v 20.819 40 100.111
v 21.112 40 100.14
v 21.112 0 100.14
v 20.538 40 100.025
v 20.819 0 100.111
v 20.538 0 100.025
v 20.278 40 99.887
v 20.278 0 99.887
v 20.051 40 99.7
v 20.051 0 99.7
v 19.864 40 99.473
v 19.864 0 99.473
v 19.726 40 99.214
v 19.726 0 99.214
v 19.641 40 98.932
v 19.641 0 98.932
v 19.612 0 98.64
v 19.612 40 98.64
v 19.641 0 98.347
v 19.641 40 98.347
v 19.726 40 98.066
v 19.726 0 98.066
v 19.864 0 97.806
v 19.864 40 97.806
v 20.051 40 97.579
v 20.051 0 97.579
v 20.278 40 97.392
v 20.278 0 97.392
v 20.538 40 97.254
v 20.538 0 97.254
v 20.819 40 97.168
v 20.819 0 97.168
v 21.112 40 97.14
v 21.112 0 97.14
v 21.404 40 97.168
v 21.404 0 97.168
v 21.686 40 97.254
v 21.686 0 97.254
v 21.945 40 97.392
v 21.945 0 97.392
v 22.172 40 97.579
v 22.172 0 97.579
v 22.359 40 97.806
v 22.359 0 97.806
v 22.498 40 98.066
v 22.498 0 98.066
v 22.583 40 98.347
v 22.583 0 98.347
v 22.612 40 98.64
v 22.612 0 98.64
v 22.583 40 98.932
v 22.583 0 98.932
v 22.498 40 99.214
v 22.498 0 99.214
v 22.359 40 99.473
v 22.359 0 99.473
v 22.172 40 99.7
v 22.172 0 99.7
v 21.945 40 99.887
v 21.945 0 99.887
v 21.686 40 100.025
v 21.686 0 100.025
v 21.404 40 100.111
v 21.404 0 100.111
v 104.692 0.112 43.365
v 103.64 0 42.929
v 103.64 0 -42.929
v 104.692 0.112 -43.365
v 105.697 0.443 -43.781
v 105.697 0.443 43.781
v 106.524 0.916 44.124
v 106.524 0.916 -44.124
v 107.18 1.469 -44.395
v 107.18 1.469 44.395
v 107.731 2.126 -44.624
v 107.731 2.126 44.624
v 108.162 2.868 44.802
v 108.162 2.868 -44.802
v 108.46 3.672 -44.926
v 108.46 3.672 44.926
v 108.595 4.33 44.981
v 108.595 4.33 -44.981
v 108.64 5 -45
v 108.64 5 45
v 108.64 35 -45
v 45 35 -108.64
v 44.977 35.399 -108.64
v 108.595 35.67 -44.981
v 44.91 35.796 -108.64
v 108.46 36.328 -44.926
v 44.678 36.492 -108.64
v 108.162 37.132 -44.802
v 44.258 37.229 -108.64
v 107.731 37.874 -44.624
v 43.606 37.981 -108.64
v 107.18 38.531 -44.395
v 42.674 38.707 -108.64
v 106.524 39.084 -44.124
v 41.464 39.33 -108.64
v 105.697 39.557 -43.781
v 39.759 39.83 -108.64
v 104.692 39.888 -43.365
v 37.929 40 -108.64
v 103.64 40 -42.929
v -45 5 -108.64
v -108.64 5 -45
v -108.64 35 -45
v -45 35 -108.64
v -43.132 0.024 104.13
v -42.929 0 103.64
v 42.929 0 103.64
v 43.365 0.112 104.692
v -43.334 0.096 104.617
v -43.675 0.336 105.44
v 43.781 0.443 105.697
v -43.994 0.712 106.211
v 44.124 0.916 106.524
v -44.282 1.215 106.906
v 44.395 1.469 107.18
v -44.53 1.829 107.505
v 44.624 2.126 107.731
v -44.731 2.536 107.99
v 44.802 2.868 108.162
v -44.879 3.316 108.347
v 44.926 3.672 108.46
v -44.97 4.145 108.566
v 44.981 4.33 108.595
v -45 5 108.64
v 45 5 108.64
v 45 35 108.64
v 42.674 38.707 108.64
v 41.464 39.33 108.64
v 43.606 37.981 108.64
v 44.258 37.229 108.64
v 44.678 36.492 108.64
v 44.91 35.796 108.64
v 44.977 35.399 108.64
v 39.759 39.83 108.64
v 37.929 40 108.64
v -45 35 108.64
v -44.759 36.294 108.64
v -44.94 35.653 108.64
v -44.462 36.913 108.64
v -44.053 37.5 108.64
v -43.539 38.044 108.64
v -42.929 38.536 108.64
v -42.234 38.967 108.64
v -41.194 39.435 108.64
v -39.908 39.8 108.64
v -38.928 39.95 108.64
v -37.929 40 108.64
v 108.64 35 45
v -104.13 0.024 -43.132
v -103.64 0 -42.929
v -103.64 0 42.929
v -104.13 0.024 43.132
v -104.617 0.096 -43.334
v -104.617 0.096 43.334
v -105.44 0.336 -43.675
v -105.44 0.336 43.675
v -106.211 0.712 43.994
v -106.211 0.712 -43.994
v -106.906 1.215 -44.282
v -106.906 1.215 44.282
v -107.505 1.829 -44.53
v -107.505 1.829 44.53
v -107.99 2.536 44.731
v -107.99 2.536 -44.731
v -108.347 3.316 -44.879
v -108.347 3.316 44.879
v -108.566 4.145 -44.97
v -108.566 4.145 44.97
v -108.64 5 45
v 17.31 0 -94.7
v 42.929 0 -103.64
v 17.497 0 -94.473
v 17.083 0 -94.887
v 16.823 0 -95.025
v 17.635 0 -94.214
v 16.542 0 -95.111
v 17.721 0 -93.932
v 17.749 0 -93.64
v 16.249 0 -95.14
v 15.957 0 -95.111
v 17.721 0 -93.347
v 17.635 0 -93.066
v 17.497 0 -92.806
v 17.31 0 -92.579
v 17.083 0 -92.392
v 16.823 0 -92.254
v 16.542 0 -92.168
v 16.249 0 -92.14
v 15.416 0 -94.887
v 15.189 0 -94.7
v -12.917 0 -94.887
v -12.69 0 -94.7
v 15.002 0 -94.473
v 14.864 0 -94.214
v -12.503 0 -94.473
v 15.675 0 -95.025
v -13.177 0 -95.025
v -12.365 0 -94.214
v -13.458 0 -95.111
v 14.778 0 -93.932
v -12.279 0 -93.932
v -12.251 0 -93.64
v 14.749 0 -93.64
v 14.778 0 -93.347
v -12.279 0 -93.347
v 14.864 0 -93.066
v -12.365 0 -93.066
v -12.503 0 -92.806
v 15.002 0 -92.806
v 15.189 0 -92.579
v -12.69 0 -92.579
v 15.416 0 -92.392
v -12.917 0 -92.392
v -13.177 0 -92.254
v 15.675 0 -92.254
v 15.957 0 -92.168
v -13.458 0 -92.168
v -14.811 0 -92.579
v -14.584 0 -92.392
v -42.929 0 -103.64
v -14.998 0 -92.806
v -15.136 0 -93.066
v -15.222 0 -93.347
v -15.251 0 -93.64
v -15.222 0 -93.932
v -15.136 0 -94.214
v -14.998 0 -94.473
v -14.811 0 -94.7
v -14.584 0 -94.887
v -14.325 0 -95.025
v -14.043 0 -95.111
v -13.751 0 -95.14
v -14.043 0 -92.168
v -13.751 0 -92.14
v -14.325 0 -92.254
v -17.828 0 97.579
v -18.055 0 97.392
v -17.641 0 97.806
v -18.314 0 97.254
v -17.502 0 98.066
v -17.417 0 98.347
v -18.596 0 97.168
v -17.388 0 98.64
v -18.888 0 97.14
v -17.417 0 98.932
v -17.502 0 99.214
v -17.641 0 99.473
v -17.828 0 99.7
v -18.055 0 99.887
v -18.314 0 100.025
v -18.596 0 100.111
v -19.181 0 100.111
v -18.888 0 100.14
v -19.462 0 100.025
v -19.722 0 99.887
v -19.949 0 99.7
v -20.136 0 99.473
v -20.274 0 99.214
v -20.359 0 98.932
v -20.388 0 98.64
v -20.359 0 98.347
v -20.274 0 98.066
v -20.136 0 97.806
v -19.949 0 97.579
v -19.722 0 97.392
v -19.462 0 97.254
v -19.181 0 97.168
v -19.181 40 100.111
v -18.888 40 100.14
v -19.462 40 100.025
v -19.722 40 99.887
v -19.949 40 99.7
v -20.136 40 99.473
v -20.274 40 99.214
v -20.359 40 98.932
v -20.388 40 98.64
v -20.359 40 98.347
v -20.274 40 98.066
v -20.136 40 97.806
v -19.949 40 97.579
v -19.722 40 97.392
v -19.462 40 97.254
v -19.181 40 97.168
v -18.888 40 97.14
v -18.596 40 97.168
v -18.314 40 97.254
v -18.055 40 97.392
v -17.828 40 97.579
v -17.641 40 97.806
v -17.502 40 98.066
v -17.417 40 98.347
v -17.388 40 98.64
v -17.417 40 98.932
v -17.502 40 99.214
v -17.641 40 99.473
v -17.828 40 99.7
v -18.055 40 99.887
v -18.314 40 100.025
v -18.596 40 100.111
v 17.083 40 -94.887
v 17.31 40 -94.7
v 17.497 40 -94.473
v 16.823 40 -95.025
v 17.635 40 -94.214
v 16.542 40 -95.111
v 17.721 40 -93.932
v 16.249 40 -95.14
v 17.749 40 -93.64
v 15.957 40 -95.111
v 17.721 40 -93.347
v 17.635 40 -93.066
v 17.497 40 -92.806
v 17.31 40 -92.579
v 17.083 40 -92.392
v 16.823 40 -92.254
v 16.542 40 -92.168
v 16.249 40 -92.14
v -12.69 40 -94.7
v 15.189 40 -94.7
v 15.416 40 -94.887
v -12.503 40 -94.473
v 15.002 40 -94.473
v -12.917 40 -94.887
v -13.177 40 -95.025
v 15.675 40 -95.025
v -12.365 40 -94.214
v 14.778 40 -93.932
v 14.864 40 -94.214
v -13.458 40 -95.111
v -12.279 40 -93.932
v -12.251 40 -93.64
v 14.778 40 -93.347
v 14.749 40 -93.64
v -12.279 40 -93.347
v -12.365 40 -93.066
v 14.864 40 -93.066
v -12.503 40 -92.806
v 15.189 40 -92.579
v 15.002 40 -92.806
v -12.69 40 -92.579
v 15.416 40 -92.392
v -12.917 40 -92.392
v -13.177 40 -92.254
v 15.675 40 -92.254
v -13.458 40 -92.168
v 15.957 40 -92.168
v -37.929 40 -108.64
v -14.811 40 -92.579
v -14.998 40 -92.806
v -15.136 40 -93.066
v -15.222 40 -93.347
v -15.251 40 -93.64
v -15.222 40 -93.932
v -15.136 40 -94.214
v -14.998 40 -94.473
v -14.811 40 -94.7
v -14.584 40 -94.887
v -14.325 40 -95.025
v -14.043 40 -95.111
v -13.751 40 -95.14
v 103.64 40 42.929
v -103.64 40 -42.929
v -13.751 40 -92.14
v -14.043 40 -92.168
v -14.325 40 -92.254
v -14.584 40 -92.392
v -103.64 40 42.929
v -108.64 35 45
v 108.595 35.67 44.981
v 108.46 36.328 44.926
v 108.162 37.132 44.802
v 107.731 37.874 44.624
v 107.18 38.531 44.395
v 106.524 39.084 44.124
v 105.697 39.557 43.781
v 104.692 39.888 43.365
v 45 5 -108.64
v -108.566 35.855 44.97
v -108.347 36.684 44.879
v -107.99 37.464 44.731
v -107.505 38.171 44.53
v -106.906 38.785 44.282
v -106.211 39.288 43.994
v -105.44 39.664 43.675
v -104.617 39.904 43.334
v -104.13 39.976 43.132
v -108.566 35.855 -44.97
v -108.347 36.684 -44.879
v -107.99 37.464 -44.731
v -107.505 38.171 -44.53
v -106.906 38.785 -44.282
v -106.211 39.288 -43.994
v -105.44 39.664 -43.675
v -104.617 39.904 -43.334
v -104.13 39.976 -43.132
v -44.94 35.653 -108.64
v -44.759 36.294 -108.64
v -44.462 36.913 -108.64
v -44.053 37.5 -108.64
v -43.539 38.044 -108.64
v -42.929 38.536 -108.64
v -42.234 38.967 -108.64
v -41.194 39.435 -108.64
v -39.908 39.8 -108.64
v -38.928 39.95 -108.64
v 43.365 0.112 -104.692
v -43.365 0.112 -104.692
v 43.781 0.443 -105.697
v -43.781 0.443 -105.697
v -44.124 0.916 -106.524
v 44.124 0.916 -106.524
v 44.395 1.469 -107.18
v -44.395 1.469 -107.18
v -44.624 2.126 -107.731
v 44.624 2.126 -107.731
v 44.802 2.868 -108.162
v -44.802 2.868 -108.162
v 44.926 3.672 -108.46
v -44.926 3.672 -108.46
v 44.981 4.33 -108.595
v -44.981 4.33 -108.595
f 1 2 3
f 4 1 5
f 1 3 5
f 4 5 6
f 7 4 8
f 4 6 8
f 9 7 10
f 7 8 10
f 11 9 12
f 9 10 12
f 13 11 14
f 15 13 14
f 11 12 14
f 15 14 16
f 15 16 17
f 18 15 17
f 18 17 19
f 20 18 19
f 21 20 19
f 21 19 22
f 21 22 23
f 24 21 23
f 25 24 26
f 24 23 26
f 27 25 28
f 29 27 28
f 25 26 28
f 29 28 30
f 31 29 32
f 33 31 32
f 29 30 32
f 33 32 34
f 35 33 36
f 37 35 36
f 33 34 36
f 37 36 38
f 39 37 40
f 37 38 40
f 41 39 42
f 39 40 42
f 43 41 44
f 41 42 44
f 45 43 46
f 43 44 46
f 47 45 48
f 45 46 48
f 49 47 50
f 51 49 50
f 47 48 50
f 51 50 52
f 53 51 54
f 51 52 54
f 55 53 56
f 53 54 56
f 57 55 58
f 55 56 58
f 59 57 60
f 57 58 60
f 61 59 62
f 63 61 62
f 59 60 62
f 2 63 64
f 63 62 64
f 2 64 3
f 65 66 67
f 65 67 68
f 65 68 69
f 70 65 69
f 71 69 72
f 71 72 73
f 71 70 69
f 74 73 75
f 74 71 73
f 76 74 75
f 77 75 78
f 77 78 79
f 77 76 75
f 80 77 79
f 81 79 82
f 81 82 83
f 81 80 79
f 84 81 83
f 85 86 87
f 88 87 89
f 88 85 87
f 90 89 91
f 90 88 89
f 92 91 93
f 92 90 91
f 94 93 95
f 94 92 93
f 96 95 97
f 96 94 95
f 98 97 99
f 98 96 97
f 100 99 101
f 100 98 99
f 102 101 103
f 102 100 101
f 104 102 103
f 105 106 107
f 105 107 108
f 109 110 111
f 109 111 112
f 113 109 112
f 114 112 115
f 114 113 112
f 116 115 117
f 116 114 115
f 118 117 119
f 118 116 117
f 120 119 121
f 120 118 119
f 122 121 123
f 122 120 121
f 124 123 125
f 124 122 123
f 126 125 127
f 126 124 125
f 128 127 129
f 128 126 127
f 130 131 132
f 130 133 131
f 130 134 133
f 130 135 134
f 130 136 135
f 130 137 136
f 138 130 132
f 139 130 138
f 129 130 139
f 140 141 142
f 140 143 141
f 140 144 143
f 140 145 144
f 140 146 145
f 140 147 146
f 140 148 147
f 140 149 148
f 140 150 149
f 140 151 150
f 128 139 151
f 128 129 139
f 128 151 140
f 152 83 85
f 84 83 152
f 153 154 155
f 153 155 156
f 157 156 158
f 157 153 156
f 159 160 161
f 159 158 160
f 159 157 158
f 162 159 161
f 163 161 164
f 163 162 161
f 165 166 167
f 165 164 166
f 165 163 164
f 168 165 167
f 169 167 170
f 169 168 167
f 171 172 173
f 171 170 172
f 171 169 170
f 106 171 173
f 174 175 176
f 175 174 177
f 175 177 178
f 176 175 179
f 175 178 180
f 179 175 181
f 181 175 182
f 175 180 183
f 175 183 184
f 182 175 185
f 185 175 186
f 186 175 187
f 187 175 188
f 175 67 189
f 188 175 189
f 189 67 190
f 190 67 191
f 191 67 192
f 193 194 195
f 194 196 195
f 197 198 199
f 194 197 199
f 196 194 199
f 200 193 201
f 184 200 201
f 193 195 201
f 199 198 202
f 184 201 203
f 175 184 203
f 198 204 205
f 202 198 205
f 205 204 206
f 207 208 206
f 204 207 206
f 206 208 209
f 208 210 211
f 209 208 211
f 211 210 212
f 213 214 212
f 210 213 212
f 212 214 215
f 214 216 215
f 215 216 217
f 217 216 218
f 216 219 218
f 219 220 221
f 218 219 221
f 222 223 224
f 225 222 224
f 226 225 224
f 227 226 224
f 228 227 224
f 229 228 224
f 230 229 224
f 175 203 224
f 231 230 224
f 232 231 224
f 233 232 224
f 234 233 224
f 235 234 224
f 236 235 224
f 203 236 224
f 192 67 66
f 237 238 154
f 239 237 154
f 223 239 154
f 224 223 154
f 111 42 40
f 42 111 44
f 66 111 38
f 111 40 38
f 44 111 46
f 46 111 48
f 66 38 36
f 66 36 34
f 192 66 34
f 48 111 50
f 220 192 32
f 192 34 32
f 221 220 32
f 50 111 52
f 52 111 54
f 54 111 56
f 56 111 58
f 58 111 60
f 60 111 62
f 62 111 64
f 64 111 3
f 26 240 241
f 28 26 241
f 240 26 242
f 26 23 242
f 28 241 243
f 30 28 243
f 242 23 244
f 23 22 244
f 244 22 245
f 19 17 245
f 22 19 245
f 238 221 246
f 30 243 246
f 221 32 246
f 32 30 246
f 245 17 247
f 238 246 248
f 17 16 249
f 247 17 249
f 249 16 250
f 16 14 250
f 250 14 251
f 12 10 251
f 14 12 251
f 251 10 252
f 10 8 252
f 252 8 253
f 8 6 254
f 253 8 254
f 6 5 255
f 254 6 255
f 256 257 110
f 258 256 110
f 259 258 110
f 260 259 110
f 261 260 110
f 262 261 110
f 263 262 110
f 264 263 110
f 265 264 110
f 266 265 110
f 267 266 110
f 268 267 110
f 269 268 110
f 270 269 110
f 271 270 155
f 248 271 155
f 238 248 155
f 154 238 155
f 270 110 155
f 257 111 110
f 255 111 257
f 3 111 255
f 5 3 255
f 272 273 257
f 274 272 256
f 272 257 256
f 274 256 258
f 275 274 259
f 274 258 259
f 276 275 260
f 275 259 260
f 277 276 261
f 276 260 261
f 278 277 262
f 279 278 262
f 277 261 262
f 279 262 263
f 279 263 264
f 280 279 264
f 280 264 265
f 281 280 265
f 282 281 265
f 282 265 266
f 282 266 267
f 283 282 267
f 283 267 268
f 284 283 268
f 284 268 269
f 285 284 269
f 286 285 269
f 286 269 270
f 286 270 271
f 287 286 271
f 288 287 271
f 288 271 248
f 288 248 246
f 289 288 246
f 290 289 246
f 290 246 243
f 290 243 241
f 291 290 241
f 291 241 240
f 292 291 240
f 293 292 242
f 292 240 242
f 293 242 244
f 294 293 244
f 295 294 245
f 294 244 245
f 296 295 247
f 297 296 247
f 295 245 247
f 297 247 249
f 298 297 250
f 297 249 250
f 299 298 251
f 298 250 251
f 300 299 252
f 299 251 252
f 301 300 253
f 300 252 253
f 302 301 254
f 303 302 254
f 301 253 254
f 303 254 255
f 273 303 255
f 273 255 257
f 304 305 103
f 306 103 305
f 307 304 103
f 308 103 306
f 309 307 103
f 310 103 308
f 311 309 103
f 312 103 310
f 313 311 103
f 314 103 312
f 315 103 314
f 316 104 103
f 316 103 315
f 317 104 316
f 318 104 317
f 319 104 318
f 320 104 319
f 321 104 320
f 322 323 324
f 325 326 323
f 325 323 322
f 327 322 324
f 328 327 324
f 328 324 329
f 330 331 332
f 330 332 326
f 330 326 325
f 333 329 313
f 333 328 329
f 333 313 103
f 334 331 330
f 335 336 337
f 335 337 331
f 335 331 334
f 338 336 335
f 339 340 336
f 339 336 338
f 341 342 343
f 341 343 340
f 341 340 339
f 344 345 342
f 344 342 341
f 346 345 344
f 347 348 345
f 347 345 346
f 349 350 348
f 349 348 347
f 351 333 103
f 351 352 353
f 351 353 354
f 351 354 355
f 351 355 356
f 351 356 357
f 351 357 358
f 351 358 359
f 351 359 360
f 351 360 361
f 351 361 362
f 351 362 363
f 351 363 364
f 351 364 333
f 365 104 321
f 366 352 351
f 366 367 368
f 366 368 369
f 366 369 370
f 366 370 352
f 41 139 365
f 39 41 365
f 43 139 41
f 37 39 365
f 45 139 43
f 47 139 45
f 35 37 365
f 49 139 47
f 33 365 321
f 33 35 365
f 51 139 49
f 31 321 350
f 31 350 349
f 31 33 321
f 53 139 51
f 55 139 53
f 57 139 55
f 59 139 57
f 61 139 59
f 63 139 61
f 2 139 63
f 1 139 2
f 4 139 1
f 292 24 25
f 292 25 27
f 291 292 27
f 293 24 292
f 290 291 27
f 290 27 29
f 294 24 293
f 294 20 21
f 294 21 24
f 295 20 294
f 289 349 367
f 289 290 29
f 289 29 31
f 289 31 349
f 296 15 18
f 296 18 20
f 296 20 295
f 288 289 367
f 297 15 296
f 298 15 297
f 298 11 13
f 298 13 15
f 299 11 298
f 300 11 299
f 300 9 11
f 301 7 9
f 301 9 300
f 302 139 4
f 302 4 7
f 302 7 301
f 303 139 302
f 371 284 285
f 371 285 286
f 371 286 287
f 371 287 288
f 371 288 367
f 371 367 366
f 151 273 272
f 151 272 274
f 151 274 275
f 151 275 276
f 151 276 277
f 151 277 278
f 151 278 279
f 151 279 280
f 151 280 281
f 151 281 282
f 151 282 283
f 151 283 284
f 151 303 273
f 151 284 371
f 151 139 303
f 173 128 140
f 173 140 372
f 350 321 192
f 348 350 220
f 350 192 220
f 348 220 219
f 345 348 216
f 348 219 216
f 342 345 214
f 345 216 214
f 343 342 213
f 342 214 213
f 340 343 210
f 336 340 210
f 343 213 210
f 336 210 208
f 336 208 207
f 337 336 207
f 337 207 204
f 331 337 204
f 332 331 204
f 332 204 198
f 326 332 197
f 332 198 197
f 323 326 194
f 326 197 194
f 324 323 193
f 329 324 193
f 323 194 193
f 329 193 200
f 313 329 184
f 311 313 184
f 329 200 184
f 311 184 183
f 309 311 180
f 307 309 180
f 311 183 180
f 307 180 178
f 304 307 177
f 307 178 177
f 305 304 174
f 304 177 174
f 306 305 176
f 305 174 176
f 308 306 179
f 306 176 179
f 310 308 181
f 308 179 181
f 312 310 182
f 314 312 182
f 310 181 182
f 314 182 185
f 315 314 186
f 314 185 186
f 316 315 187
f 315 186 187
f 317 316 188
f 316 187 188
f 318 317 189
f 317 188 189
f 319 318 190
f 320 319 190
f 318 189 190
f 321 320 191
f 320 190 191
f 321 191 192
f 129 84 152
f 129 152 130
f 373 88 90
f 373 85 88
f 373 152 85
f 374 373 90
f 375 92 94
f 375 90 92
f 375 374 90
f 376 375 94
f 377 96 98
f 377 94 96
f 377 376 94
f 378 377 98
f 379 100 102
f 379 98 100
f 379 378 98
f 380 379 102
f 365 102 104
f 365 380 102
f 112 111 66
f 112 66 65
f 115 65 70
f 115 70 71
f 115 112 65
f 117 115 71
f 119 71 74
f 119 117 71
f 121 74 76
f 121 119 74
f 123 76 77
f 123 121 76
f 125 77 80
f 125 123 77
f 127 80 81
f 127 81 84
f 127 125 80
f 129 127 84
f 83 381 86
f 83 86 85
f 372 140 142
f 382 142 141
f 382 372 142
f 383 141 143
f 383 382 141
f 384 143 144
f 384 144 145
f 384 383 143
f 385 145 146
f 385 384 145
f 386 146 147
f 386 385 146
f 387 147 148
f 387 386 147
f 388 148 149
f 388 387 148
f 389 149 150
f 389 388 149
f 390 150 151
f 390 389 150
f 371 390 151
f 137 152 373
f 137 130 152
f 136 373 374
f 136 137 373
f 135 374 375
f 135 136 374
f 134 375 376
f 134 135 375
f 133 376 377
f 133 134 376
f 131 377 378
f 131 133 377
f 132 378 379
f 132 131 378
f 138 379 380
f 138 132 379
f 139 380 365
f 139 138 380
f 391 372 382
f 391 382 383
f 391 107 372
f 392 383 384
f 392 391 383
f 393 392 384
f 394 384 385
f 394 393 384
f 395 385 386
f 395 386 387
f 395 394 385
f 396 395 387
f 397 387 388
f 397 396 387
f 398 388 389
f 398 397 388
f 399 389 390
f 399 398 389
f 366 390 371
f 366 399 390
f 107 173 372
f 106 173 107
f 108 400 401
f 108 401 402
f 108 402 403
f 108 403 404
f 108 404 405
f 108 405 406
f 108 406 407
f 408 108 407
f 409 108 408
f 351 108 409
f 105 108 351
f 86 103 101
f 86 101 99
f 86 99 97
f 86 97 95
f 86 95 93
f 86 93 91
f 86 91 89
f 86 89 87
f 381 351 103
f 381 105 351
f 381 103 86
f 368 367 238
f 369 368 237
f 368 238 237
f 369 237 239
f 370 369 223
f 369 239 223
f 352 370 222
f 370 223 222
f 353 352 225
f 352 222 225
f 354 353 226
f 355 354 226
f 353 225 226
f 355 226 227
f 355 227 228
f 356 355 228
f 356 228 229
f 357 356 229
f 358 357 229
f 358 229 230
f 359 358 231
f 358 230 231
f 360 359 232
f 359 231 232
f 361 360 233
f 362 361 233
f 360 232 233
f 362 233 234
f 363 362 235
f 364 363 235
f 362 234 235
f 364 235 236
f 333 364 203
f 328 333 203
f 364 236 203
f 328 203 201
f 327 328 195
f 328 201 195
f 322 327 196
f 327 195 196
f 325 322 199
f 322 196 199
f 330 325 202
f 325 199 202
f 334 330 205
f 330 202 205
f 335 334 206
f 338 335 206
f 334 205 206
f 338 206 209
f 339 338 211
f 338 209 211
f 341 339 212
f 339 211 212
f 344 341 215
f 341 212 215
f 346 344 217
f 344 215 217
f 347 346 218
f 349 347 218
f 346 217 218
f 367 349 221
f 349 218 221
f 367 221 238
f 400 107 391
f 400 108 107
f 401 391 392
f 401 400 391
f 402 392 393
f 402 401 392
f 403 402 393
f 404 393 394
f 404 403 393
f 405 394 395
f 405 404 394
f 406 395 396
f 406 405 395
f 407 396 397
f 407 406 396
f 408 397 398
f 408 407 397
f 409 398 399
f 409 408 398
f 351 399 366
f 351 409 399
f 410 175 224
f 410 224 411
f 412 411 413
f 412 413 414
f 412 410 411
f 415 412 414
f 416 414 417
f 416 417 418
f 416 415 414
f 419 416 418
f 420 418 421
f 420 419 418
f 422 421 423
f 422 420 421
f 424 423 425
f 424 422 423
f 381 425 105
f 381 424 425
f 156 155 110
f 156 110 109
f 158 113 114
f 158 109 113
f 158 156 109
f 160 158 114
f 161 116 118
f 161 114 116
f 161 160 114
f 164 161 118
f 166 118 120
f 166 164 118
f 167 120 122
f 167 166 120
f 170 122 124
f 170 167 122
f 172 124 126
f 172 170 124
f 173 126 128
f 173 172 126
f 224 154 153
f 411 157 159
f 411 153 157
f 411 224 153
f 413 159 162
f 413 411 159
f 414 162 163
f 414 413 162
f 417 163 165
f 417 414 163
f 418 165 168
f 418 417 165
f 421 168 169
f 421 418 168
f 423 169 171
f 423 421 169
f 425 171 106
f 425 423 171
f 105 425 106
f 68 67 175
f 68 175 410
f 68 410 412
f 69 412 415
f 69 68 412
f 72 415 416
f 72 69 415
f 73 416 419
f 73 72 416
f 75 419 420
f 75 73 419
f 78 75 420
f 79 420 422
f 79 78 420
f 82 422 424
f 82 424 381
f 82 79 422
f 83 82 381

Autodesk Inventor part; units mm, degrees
ref_plane "YZ Plane" through (0, 0, 0) normal (1, 0, 0) x (0, 1, 0)
ref_plane "XZ Plane" through (0, 0, 0) normal (0, 1, 0) x (-1, 0, 0)
ref_plane "XY Plane" through (0, 0, 0) normal (0, 0, 1) x (1, 0, 0)
sketch "Эскиз1" plane through (0, 0, 0) normal (0, 1, 0) x (-1, 0, 0)
  line L0 (108.6396, 45) -> (108.6396, -45)
  line L1 (108.6396, -45) -> (45, -108.6396)
  line L2 (45, -108.6396) -> (-45, -108.6396)
  line L3 (-45, -108.6396) -> (-108.6396, -45)
  line L4 (-108.6396, -45) -> (-108.6396, 45)
  line L5 (-108.6396, 45) -> (-45, 108.6396)
  line L6 (-45, 108.6396) -> (45, 108.6396)
  line L7 (45, 108.6396) -> (108.6396, 45)
  point P0 (0, 0)
  point P1 (0, 0)
  dimension "d0" = 90
extrude "Выдавливание1" add sketch "Эскиз1" along normal blind 40
sketch "Эскиз2" plane through (0, 40, 0) normal (0, 1, 0) x (1, 0, 0)
  line L0 (-108.6396, 45) -> (-108.6396, -45) projected
  line L1 (-108.6396, -45) -> (-45, -108.6396) projected
  line L2 (-45, -108.6396) -> (45, -108.6396) projected
  line L3 (45, -108.6396) -> (108.6396, -45) projected
  line L4 (108.6396, -45) -> (108.6396, 45) projected
  line L5 (108.6396, 45) -> (45, 108.6396) projected
  line L6 (45, 108.6396) -> (-45, 108.6396) projected
  line L7 (-45, 108.6396) -> (-108.6396, 45) projected
  point P0 (0, 0)
  point P1 (-18.8883, -98.6396)
  point P2 (21.1117, -98.6396)
  point P3 (-13.7506, 93.6396)
  point P4 (16.2494, 93.6396)
  dimension "d3" = 40
  dimension "d4" = 10
  dimension "d12" = 30
  dimension "d13" = 15
hole "Отверстие1" at (-18.8883, 40, 98.6396) at (21.1117, 40, 98.6396) at (-13.7506, 40, -93.6396) at (16.2494, 40, -93.6396) direction (0, -1, 0) diameter 3 end through all
fillet "Сопряжение1" radius 5 14 edges at (-76.8198, 40, 76.8198) (-108.6396, 40, 0) (-76.8198, 40, -76.8198) (76.8198, 40, 76.8198) (108.6396, 40, 0) (76.8198, 40, -76.8198) (76.8198, 0, -76.8198) (108.6396, 0, 0) (76.8198, 0, 76.8198) (0, 0, -108.6396) (-76.8198, 0, -76.8198) (-108.6396, 0, 0) (-76.8198, 0, 76.8198) (0, 0, 108.6396)
properties part number "stand_bottom"
